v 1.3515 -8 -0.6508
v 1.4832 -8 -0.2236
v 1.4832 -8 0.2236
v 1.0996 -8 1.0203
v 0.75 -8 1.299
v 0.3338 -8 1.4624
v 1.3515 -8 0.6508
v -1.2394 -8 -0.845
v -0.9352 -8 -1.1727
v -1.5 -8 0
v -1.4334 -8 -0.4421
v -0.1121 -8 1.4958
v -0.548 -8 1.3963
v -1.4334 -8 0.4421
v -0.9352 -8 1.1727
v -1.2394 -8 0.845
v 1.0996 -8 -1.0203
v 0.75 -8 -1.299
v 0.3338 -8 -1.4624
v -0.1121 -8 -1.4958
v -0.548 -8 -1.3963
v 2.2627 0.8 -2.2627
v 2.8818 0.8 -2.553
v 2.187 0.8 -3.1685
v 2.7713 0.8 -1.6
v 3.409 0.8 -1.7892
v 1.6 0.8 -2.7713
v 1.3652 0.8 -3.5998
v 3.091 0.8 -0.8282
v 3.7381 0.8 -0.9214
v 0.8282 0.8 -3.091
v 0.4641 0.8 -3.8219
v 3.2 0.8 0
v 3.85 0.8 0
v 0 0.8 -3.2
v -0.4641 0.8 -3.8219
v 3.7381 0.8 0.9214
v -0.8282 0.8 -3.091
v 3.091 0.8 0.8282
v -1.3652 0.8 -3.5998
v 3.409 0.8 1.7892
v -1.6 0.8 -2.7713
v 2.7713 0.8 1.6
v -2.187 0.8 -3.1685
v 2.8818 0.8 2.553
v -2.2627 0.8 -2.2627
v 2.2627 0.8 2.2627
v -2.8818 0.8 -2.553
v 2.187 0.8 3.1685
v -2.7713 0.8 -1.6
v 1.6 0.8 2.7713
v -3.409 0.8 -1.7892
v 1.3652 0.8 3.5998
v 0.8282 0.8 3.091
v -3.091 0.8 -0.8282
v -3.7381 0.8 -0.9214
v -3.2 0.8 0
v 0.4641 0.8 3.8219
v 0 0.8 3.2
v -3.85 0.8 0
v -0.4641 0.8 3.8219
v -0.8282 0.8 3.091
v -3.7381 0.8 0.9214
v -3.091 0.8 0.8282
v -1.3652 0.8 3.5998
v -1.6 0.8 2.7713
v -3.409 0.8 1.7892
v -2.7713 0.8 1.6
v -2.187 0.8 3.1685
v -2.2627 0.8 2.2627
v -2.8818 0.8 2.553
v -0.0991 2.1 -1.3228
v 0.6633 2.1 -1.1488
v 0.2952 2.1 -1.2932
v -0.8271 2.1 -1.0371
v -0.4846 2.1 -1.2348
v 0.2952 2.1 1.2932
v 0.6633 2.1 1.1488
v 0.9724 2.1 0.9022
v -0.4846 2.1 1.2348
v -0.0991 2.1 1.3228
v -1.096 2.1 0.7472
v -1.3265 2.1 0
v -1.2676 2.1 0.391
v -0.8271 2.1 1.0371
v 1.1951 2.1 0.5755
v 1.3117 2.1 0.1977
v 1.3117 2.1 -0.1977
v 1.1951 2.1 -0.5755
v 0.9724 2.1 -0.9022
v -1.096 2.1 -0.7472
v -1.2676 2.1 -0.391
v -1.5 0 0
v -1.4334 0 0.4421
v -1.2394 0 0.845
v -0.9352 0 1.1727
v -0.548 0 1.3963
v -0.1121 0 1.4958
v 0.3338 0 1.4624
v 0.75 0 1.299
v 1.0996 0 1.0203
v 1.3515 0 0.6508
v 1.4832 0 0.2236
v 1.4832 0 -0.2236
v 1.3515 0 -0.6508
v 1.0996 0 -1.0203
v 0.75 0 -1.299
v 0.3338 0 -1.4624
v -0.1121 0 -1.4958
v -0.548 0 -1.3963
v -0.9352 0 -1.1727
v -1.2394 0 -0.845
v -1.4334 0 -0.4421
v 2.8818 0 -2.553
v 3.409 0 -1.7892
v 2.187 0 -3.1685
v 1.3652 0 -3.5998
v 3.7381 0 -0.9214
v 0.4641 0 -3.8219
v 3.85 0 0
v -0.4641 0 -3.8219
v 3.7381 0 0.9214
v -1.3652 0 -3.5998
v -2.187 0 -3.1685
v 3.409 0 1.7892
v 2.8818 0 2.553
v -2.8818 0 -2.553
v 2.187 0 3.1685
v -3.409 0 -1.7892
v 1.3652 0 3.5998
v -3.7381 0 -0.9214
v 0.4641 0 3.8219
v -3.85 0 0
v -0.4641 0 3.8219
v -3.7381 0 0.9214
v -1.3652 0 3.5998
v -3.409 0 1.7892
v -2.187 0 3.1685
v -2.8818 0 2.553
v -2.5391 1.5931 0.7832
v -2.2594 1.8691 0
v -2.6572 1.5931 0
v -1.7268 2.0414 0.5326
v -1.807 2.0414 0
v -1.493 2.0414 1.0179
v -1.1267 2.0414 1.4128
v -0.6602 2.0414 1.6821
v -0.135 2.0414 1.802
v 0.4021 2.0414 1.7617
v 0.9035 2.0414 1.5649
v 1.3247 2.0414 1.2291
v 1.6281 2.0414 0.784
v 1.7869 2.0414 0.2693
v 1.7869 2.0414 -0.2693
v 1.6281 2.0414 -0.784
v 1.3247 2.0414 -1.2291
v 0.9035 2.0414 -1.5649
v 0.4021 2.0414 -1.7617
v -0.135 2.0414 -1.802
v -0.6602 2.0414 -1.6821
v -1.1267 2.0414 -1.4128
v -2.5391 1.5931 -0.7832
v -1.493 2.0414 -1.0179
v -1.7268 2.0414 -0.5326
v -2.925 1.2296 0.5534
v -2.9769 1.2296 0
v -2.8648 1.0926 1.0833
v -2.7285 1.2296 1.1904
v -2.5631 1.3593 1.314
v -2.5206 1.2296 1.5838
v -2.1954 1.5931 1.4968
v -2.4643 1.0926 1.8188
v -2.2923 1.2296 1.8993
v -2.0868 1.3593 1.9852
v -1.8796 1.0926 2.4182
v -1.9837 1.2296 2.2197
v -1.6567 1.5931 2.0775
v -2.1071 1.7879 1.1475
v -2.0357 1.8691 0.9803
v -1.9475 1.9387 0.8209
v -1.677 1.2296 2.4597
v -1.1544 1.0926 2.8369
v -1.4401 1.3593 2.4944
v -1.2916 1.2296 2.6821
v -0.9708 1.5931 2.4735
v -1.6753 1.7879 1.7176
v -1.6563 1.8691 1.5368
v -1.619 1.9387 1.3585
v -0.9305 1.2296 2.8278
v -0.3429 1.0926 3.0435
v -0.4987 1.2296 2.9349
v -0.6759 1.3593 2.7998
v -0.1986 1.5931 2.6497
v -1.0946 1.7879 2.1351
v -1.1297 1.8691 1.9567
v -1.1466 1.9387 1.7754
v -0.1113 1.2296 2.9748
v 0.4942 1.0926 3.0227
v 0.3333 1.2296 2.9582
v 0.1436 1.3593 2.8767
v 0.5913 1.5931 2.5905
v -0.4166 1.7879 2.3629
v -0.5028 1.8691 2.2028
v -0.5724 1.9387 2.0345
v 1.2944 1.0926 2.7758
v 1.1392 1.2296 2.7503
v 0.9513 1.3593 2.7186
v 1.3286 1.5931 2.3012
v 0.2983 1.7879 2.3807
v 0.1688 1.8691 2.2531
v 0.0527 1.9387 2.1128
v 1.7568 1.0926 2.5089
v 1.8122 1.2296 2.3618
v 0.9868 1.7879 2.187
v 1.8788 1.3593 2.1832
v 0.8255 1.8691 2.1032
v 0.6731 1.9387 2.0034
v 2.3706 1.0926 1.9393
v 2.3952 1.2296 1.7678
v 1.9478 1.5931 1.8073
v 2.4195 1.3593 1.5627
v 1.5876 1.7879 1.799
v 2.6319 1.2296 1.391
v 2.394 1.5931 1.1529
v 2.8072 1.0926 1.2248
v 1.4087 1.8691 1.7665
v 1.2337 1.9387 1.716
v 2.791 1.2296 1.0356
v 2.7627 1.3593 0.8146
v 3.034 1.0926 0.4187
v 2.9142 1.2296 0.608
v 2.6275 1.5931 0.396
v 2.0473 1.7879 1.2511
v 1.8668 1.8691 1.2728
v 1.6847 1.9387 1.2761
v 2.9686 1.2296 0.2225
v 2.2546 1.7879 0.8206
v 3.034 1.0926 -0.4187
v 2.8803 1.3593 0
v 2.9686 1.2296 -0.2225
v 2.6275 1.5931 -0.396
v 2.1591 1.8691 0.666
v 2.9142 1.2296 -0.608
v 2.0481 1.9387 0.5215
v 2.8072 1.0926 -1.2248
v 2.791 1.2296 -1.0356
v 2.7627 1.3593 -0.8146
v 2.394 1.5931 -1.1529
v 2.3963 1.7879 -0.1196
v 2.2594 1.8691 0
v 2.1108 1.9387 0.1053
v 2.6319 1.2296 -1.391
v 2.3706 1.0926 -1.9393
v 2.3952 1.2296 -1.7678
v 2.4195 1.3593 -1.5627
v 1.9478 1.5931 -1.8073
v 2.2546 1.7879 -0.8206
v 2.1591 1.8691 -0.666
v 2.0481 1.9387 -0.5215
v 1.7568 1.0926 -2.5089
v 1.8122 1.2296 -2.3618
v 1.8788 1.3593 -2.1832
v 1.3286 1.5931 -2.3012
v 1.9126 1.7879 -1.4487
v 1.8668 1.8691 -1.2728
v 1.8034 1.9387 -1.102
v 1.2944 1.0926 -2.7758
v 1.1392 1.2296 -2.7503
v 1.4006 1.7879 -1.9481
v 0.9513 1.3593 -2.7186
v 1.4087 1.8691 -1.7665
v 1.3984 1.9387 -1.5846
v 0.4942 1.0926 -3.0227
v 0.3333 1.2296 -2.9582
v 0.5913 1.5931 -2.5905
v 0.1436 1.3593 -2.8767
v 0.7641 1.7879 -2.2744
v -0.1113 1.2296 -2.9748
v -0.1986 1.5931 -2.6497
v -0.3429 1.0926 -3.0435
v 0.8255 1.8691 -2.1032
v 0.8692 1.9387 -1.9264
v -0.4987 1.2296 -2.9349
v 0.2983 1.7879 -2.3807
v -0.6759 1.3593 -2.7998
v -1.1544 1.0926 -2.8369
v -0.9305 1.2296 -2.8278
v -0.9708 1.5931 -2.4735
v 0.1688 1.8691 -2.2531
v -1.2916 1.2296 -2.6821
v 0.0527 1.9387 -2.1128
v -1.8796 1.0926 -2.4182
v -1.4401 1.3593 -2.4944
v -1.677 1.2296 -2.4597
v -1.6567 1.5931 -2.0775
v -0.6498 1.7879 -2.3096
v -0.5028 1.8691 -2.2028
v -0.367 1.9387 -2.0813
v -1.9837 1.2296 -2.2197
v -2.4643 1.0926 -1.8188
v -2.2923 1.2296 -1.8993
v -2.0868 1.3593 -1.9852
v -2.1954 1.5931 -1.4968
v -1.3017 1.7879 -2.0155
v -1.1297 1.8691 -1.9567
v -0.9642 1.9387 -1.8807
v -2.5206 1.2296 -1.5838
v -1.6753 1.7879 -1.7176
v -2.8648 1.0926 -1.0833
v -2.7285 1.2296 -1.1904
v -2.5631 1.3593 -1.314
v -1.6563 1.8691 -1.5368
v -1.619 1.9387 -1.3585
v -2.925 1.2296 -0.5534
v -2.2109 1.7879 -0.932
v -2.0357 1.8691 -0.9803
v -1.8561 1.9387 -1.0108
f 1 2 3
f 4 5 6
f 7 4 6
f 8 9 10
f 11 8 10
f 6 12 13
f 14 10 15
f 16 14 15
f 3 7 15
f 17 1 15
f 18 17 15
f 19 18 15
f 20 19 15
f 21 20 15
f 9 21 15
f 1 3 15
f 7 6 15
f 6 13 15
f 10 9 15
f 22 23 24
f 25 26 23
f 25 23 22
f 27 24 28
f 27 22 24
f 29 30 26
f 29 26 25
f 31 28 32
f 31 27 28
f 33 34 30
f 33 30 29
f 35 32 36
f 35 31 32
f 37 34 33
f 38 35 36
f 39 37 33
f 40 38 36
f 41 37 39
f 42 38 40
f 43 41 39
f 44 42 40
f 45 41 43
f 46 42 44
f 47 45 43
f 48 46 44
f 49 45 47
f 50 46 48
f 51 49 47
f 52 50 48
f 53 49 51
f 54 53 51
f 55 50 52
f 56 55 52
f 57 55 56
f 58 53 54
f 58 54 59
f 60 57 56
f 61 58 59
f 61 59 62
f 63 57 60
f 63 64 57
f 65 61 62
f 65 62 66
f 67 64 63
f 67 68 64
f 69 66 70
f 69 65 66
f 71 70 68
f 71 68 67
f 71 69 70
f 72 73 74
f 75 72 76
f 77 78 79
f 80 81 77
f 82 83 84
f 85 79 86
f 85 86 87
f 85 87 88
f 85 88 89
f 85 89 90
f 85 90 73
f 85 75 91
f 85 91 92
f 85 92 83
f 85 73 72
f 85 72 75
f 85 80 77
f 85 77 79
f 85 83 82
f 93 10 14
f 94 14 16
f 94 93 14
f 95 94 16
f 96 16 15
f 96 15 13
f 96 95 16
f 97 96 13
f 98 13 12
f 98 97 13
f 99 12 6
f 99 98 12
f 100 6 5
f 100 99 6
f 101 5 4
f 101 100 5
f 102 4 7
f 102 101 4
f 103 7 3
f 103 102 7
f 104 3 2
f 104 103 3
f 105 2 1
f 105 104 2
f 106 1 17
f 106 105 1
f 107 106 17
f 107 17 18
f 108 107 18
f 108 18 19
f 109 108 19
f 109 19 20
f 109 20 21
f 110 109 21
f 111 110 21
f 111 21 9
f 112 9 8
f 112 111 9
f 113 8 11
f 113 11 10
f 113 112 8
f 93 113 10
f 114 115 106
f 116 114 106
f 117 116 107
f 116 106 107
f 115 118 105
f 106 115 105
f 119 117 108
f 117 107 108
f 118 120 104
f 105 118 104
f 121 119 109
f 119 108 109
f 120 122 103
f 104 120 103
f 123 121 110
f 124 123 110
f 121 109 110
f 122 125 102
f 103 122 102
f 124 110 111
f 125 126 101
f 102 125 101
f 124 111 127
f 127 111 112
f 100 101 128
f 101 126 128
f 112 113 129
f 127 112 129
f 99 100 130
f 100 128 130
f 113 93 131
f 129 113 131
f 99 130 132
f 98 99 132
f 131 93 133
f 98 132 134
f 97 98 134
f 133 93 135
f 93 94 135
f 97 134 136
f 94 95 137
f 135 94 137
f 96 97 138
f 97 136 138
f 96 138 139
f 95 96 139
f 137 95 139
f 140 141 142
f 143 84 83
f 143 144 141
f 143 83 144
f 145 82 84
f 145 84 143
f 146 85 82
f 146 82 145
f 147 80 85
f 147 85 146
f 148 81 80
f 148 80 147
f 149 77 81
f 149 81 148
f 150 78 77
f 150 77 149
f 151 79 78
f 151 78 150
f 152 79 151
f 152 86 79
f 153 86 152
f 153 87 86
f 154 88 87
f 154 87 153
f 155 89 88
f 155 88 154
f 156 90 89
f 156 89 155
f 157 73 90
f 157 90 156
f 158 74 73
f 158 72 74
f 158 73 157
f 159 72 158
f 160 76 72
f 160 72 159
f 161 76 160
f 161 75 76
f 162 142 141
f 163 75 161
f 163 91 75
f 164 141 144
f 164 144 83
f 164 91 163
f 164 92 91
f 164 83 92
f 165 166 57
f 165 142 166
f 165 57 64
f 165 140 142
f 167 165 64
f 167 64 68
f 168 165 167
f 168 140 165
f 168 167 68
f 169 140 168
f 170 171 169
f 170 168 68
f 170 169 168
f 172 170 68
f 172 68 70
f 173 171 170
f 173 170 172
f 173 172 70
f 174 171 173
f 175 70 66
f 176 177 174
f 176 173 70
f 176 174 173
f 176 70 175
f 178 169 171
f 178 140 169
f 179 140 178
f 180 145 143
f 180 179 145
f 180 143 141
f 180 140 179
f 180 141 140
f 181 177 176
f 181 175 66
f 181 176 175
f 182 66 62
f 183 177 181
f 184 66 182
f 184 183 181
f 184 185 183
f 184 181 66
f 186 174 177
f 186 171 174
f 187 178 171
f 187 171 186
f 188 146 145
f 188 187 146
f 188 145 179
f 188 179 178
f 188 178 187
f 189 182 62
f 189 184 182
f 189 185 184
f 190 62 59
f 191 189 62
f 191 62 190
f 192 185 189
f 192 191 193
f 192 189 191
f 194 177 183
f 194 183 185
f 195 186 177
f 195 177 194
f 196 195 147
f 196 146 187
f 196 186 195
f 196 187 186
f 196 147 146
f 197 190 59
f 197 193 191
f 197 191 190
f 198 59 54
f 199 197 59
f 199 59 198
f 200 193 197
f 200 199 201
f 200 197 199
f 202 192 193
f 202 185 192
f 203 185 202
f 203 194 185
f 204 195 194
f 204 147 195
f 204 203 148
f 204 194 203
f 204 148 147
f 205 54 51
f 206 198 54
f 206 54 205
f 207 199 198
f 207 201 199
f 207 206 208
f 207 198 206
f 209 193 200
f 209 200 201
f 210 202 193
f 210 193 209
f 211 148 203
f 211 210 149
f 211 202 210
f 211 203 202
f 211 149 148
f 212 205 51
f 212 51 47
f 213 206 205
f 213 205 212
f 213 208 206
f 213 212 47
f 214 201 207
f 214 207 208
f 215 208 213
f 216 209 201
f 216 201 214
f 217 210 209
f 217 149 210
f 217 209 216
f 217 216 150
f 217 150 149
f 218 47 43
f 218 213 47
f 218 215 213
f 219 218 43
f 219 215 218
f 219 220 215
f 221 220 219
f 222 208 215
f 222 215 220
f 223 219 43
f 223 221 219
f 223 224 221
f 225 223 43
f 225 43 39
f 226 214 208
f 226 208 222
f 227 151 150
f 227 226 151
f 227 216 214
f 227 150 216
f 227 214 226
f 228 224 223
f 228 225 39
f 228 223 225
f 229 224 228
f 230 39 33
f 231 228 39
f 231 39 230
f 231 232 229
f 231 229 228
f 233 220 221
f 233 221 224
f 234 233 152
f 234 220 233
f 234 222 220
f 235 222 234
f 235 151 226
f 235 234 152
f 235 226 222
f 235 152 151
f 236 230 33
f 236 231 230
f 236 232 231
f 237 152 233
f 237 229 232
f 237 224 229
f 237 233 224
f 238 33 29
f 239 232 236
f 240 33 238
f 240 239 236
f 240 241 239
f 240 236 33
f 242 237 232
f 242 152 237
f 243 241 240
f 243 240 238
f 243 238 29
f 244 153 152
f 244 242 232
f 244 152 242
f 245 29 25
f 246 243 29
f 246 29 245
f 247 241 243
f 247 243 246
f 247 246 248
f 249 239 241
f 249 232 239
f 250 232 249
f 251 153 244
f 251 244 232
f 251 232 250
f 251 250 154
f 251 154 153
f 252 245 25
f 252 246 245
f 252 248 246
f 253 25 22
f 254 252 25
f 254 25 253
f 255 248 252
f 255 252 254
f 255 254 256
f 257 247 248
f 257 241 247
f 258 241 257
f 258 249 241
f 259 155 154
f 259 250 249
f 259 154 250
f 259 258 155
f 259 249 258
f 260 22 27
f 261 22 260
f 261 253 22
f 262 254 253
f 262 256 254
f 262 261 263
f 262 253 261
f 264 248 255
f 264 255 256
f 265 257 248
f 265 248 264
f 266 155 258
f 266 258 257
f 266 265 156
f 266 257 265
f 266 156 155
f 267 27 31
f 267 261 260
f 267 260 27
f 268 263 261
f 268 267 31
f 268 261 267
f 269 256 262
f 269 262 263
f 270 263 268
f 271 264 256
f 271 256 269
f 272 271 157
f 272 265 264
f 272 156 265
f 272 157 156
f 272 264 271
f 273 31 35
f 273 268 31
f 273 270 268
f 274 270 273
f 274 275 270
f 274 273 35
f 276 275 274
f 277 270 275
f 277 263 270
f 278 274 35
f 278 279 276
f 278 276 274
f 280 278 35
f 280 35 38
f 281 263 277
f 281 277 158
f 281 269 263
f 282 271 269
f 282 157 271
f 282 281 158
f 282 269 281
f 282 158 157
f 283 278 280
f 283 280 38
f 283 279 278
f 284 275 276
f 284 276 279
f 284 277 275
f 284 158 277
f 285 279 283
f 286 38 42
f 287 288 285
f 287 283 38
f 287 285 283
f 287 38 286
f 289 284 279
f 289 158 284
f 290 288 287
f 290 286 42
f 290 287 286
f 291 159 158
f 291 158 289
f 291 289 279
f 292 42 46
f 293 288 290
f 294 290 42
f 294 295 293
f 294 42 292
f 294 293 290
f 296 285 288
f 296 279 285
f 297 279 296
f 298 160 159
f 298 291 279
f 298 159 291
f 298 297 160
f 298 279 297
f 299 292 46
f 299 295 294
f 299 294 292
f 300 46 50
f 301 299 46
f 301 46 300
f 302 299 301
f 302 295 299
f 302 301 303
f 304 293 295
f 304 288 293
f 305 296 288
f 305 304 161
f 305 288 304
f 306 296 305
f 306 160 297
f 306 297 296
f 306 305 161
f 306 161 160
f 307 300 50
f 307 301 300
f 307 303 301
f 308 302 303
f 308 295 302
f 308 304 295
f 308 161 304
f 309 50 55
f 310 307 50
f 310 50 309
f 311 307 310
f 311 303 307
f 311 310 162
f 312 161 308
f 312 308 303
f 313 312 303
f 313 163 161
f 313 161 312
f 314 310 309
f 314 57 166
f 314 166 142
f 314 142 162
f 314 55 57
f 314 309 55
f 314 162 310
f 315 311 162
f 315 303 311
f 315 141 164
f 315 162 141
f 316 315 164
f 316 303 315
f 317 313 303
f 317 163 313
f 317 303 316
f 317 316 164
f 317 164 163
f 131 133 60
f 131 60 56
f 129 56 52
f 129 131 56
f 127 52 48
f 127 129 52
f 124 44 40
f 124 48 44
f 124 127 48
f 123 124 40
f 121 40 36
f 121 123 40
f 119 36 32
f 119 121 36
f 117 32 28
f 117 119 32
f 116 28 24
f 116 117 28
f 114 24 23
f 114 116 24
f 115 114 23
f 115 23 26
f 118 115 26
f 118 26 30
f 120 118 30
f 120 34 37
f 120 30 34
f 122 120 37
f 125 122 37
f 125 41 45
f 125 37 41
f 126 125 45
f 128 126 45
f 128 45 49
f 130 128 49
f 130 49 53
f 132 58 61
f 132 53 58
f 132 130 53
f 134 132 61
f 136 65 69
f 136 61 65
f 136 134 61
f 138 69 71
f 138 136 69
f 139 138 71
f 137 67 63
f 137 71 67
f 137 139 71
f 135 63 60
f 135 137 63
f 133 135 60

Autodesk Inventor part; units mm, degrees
ref_plane "YZ Plane" through (0, 0, 0) normal (1, 0, 0) x (0, 1, 0)
ref_plane "XZ Plane" through (0, 0, 0) normal (0, 1, 0) x (-1, 0, 0)
ref_plane "XY Plane" through (0, 0, 0) normal (0, 0, 1) x (1, 0, 0)
sketch "スケッチ1" plane through (0, 0, 0) normal (0, 1, 0) x (-1, 0, 0)
  circle A0 centre (0, 0) radius 3.85
  circle A1 centre (0, 0) radius 1.5
  circle A2 centre (0, 0) radius 3.2
  dimension "d0" = 7.7
  dimension "d1" = 3
  dimension "d6" = 6.4
extrude "押し出し1" add sketch "スケッチ1" against normal blind 8 contours A1
extrude "押し出し2" add sketch "スケッチ1" along normal blind 0.8 contours A0 | A1 | A2
extrude "押し出し3" add sketch "スケッチ1" along normal blind 2.1 contours A1 | A2
fillet "フィレット1" radius 2 1 edges at (3.2, 2.1, 0)
thread "ねじ1" size "M3x0.5" class "6g" standard "ANSI Metric M Profile" full length
properties part number "ClampHorn_Screw"
